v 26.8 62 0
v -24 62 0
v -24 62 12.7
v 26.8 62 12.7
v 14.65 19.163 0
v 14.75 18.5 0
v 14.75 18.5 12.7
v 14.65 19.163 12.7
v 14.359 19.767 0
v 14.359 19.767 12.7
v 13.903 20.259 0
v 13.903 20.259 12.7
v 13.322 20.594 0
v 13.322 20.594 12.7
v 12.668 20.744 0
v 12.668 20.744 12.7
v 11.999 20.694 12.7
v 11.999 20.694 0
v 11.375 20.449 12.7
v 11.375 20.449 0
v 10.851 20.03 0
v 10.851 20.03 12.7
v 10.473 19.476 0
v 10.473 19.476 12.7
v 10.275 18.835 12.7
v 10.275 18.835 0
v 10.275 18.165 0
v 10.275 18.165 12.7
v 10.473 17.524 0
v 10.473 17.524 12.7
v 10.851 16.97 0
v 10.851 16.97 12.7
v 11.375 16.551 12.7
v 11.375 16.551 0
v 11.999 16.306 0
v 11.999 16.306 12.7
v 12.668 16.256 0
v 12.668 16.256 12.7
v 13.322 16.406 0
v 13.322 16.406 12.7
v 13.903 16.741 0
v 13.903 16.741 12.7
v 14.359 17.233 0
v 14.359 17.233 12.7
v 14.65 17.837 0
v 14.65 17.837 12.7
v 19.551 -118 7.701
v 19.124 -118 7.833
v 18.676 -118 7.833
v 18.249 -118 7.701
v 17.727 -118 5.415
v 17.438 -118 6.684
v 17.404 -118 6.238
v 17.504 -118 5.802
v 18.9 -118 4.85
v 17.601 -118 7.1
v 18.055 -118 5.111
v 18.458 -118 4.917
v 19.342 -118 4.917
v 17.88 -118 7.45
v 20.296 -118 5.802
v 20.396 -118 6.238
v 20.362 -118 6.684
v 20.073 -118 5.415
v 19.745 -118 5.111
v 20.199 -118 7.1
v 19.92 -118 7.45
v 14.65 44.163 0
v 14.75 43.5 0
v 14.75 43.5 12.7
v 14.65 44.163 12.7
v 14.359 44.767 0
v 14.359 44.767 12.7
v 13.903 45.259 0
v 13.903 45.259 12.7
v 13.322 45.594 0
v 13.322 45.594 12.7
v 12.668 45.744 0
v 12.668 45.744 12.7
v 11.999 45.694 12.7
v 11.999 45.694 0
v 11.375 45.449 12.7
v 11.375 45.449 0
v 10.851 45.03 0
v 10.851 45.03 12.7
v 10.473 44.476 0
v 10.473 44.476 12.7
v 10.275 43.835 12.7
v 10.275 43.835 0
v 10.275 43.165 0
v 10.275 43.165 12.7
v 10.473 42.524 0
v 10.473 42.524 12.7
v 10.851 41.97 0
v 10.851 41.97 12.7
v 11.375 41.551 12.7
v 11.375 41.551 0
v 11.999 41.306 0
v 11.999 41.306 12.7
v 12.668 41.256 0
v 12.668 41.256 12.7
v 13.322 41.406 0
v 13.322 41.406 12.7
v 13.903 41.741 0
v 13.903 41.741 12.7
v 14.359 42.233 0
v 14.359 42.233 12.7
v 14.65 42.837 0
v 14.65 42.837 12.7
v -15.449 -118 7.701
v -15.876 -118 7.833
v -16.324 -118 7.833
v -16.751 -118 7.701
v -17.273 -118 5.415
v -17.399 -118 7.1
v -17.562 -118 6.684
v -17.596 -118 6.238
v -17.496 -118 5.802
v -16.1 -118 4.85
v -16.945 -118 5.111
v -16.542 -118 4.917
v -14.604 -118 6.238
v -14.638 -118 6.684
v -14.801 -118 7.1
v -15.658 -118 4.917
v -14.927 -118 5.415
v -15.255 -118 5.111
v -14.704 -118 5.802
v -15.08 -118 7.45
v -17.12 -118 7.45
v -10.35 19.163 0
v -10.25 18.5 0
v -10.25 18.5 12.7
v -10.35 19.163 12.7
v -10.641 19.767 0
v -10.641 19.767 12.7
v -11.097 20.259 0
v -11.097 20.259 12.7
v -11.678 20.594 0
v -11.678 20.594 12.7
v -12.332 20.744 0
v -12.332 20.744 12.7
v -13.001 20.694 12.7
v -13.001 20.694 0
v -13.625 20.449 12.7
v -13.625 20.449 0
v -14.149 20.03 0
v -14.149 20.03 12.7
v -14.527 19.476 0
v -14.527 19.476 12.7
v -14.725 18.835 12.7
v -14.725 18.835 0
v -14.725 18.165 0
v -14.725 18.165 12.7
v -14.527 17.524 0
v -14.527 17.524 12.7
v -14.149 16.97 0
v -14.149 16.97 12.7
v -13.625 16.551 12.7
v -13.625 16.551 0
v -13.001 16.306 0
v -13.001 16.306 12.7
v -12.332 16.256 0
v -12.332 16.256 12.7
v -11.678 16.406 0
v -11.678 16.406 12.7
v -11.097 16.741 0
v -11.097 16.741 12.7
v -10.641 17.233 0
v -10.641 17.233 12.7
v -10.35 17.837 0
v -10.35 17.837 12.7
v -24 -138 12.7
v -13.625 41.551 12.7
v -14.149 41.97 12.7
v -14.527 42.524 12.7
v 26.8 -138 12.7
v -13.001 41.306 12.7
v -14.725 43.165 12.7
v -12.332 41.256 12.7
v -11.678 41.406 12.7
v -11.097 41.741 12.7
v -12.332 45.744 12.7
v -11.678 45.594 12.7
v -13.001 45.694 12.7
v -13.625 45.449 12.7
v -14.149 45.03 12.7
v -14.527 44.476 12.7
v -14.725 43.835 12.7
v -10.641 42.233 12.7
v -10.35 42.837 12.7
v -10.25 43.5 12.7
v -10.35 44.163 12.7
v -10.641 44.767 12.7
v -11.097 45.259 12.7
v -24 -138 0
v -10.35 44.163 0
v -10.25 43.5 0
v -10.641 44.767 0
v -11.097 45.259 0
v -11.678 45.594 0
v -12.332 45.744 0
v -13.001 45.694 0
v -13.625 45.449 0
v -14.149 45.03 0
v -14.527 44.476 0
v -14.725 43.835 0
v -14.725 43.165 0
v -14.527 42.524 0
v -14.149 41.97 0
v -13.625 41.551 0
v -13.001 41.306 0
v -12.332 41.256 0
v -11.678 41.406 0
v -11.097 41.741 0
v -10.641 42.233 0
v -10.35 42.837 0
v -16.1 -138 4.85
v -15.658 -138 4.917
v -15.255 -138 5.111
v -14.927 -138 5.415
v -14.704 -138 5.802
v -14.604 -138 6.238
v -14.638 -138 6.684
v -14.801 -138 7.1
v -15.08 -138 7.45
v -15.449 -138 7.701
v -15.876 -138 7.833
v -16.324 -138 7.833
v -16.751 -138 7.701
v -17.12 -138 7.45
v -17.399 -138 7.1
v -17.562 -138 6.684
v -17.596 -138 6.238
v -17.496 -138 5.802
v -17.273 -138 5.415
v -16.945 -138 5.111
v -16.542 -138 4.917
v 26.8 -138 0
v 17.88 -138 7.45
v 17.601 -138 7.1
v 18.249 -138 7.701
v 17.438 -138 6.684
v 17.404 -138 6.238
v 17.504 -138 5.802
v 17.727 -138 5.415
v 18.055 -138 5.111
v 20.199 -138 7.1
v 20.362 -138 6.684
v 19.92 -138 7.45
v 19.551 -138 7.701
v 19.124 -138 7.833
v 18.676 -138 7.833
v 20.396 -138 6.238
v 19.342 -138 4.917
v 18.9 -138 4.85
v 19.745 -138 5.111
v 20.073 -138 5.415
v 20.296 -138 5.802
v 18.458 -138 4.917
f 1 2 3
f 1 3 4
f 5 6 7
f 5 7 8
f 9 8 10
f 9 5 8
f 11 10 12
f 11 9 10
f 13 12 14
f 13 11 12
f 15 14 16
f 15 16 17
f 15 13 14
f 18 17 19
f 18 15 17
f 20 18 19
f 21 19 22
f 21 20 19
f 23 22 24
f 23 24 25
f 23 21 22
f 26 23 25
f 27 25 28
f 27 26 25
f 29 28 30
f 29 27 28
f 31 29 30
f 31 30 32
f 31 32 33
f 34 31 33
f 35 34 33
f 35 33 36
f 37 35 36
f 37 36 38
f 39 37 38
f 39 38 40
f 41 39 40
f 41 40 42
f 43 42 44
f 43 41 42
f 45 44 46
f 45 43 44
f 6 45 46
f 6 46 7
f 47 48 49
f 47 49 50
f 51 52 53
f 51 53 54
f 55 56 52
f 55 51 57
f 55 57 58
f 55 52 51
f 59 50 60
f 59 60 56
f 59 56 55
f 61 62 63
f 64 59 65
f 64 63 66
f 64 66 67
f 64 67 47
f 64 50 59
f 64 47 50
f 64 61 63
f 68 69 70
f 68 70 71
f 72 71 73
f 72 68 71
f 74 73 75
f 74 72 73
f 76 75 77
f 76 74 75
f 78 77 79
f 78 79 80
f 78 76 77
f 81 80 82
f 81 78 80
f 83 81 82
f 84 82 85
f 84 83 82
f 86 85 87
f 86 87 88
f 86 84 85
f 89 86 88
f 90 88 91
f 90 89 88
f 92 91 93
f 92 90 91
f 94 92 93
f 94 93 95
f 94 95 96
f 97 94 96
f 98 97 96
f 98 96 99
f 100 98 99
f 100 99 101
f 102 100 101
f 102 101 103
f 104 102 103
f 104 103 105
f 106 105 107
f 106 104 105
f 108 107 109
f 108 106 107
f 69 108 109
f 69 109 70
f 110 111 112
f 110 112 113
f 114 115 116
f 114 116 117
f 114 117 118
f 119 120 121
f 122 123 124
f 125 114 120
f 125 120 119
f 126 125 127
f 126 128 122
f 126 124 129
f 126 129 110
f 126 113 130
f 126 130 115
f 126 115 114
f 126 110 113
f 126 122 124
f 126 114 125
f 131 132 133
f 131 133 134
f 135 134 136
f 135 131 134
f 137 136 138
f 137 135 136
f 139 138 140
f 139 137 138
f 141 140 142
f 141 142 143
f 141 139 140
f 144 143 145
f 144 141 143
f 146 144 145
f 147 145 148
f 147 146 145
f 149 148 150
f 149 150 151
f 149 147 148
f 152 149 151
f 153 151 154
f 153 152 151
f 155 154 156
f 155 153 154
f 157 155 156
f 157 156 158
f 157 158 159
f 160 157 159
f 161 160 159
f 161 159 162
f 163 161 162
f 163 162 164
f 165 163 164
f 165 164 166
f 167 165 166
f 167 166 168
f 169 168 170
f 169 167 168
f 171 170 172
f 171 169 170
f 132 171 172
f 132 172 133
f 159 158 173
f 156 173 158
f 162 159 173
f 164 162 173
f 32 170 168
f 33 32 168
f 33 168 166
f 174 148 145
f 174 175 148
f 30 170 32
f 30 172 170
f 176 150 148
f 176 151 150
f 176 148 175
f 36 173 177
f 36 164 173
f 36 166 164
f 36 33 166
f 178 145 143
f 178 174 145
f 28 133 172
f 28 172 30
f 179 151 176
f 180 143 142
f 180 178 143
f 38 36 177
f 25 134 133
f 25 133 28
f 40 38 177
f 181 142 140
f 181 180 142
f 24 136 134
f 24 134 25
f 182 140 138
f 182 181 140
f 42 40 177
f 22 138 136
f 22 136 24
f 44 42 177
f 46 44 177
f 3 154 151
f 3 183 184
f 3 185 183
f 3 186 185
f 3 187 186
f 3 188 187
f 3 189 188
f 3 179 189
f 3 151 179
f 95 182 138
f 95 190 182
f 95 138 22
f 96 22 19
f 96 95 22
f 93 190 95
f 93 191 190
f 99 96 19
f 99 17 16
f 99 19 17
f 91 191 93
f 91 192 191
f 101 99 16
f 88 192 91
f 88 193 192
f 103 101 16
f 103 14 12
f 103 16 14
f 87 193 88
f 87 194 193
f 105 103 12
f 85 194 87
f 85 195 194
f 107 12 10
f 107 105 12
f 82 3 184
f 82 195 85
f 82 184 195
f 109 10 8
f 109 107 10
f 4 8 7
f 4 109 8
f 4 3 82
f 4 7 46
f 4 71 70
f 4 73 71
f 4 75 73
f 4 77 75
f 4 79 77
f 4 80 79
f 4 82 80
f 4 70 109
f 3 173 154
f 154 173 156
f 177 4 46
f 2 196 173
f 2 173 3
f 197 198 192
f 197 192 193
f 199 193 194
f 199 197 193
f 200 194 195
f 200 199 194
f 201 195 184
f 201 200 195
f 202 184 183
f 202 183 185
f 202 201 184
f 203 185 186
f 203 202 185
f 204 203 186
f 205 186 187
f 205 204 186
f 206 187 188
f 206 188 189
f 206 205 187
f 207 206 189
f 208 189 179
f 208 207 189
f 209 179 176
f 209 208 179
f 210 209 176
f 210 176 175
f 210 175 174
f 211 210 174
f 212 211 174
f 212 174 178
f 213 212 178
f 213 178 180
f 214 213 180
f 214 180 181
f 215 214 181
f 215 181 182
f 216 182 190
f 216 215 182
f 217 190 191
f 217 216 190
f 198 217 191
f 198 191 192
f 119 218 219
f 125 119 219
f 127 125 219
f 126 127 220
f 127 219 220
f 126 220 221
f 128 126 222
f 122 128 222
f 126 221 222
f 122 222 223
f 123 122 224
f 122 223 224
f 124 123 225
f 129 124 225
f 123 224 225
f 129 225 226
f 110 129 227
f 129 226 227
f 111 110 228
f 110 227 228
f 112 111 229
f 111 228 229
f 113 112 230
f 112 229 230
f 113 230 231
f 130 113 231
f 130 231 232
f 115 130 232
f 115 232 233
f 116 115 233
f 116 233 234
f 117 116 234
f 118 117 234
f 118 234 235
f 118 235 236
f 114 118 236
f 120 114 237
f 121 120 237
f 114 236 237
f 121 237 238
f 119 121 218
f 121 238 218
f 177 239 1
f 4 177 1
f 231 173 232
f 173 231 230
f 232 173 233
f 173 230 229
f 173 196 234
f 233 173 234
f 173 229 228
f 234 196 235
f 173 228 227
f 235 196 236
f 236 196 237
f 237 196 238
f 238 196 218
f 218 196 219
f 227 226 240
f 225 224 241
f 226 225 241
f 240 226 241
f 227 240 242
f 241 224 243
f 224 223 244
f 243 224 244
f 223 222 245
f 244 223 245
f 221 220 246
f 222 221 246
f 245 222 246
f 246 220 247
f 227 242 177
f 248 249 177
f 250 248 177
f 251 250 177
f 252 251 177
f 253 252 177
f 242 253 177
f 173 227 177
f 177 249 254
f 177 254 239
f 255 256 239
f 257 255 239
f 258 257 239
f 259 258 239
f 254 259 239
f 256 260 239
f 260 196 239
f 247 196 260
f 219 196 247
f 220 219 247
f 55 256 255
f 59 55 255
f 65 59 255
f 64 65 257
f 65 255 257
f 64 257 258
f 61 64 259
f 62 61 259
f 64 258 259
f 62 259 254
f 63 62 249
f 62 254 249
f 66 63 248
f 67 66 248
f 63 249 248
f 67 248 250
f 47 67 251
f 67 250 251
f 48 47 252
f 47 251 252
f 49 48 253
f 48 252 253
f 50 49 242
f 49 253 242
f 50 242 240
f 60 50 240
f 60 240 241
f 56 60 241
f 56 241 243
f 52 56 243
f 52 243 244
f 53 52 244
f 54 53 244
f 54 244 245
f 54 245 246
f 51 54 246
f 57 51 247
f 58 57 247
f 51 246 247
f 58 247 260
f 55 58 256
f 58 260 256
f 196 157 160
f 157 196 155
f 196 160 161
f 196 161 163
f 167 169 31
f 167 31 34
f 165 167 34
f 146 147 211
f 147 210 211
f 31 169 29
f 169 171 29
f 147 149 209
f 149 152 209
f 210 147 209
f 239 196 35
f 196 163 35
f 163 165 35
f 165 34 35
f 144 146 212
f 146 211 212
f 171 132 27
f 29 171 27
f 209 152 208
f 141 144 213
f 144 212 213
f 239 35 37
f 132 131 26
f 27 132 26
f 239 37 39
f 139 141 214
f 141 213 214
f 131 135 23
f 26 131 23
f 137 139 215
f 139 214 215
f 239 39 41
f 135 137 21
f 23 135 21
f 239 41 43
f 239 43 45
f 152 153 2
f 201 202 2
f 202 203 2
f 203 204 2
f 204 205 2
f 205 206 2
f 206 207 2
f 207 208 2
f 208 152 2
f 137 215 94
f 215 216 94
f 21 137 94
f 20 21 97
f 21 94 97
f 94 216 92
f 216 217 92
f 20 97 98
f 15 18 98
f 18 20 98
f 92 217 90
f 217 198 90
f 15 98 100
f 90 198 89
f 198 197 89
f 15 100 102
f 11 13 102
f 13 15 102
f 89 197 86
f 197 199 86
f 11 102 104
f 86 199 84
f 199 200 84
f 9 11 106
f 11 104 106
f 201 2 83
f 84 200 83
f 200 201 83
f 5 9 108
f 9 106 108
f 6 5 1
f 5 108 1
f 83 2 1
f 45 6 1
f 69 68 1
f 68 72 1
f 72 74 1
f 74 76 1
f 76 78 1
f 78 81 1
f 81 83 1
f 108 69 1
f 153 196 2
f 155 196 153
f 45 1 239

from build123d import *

# Parameters (mm, degrees)
CROQUIS1_W              = 50.8
CROQUIS1_H              = 200
CROQUIS1_R              = 2.25
SALIENTE_EXTRUIR1_DEPTH = 12.7
CROQUIS2_R              = 1.5
CORTAR_EXTRUIR1_DEPTH   = 20


with BuildPart() as part:
    # Croquis1 → Saliente-Extruir1 (new body)
    with BuildSketch(Plane.XY):
        with Locations((1.4, -38)):
            Rectangle(CROQUIS1_W, CROQUIS1_H)
        with Locations((-12.5, 43.5)):
            Circle(CROQUIS1_R, mode=Mode.SUBTRACT)
        with Locations((12.5, 43.5)):
            Circle(CROQUIS1_R, mode=Mode.SUBTRACT)
        with Locations((12.5, 18.5)):
            Circle(CROQUIS1_R, mode=Mode.SUBTRACT)
        with Locations((-12.5, 18.5)):
            Circle(CROQUIS1_R, mode=Mode.SUBTRACT)
    extrude(amount=SALIENTE_EXTRUIR1_DEPTH)

    # Croquis2 → Cortar-Extruir1 (cut)
    with BuildSketch(Plane.XZ.offset(138)):
        with Locations(Location((-16.1, 6.35, 0), (0, 0, 270))):
            Circle(CROQUIS2_R)
        with Locations(Location((18.9, 6.35, 0), (0, 0, 270))):
            Circle(CROQUIS2_R)
    extrude(amount=-CORTAR_EXTRUIR1_DEPTH, mode=Mode.SUBTRACT)


solid = part.part
